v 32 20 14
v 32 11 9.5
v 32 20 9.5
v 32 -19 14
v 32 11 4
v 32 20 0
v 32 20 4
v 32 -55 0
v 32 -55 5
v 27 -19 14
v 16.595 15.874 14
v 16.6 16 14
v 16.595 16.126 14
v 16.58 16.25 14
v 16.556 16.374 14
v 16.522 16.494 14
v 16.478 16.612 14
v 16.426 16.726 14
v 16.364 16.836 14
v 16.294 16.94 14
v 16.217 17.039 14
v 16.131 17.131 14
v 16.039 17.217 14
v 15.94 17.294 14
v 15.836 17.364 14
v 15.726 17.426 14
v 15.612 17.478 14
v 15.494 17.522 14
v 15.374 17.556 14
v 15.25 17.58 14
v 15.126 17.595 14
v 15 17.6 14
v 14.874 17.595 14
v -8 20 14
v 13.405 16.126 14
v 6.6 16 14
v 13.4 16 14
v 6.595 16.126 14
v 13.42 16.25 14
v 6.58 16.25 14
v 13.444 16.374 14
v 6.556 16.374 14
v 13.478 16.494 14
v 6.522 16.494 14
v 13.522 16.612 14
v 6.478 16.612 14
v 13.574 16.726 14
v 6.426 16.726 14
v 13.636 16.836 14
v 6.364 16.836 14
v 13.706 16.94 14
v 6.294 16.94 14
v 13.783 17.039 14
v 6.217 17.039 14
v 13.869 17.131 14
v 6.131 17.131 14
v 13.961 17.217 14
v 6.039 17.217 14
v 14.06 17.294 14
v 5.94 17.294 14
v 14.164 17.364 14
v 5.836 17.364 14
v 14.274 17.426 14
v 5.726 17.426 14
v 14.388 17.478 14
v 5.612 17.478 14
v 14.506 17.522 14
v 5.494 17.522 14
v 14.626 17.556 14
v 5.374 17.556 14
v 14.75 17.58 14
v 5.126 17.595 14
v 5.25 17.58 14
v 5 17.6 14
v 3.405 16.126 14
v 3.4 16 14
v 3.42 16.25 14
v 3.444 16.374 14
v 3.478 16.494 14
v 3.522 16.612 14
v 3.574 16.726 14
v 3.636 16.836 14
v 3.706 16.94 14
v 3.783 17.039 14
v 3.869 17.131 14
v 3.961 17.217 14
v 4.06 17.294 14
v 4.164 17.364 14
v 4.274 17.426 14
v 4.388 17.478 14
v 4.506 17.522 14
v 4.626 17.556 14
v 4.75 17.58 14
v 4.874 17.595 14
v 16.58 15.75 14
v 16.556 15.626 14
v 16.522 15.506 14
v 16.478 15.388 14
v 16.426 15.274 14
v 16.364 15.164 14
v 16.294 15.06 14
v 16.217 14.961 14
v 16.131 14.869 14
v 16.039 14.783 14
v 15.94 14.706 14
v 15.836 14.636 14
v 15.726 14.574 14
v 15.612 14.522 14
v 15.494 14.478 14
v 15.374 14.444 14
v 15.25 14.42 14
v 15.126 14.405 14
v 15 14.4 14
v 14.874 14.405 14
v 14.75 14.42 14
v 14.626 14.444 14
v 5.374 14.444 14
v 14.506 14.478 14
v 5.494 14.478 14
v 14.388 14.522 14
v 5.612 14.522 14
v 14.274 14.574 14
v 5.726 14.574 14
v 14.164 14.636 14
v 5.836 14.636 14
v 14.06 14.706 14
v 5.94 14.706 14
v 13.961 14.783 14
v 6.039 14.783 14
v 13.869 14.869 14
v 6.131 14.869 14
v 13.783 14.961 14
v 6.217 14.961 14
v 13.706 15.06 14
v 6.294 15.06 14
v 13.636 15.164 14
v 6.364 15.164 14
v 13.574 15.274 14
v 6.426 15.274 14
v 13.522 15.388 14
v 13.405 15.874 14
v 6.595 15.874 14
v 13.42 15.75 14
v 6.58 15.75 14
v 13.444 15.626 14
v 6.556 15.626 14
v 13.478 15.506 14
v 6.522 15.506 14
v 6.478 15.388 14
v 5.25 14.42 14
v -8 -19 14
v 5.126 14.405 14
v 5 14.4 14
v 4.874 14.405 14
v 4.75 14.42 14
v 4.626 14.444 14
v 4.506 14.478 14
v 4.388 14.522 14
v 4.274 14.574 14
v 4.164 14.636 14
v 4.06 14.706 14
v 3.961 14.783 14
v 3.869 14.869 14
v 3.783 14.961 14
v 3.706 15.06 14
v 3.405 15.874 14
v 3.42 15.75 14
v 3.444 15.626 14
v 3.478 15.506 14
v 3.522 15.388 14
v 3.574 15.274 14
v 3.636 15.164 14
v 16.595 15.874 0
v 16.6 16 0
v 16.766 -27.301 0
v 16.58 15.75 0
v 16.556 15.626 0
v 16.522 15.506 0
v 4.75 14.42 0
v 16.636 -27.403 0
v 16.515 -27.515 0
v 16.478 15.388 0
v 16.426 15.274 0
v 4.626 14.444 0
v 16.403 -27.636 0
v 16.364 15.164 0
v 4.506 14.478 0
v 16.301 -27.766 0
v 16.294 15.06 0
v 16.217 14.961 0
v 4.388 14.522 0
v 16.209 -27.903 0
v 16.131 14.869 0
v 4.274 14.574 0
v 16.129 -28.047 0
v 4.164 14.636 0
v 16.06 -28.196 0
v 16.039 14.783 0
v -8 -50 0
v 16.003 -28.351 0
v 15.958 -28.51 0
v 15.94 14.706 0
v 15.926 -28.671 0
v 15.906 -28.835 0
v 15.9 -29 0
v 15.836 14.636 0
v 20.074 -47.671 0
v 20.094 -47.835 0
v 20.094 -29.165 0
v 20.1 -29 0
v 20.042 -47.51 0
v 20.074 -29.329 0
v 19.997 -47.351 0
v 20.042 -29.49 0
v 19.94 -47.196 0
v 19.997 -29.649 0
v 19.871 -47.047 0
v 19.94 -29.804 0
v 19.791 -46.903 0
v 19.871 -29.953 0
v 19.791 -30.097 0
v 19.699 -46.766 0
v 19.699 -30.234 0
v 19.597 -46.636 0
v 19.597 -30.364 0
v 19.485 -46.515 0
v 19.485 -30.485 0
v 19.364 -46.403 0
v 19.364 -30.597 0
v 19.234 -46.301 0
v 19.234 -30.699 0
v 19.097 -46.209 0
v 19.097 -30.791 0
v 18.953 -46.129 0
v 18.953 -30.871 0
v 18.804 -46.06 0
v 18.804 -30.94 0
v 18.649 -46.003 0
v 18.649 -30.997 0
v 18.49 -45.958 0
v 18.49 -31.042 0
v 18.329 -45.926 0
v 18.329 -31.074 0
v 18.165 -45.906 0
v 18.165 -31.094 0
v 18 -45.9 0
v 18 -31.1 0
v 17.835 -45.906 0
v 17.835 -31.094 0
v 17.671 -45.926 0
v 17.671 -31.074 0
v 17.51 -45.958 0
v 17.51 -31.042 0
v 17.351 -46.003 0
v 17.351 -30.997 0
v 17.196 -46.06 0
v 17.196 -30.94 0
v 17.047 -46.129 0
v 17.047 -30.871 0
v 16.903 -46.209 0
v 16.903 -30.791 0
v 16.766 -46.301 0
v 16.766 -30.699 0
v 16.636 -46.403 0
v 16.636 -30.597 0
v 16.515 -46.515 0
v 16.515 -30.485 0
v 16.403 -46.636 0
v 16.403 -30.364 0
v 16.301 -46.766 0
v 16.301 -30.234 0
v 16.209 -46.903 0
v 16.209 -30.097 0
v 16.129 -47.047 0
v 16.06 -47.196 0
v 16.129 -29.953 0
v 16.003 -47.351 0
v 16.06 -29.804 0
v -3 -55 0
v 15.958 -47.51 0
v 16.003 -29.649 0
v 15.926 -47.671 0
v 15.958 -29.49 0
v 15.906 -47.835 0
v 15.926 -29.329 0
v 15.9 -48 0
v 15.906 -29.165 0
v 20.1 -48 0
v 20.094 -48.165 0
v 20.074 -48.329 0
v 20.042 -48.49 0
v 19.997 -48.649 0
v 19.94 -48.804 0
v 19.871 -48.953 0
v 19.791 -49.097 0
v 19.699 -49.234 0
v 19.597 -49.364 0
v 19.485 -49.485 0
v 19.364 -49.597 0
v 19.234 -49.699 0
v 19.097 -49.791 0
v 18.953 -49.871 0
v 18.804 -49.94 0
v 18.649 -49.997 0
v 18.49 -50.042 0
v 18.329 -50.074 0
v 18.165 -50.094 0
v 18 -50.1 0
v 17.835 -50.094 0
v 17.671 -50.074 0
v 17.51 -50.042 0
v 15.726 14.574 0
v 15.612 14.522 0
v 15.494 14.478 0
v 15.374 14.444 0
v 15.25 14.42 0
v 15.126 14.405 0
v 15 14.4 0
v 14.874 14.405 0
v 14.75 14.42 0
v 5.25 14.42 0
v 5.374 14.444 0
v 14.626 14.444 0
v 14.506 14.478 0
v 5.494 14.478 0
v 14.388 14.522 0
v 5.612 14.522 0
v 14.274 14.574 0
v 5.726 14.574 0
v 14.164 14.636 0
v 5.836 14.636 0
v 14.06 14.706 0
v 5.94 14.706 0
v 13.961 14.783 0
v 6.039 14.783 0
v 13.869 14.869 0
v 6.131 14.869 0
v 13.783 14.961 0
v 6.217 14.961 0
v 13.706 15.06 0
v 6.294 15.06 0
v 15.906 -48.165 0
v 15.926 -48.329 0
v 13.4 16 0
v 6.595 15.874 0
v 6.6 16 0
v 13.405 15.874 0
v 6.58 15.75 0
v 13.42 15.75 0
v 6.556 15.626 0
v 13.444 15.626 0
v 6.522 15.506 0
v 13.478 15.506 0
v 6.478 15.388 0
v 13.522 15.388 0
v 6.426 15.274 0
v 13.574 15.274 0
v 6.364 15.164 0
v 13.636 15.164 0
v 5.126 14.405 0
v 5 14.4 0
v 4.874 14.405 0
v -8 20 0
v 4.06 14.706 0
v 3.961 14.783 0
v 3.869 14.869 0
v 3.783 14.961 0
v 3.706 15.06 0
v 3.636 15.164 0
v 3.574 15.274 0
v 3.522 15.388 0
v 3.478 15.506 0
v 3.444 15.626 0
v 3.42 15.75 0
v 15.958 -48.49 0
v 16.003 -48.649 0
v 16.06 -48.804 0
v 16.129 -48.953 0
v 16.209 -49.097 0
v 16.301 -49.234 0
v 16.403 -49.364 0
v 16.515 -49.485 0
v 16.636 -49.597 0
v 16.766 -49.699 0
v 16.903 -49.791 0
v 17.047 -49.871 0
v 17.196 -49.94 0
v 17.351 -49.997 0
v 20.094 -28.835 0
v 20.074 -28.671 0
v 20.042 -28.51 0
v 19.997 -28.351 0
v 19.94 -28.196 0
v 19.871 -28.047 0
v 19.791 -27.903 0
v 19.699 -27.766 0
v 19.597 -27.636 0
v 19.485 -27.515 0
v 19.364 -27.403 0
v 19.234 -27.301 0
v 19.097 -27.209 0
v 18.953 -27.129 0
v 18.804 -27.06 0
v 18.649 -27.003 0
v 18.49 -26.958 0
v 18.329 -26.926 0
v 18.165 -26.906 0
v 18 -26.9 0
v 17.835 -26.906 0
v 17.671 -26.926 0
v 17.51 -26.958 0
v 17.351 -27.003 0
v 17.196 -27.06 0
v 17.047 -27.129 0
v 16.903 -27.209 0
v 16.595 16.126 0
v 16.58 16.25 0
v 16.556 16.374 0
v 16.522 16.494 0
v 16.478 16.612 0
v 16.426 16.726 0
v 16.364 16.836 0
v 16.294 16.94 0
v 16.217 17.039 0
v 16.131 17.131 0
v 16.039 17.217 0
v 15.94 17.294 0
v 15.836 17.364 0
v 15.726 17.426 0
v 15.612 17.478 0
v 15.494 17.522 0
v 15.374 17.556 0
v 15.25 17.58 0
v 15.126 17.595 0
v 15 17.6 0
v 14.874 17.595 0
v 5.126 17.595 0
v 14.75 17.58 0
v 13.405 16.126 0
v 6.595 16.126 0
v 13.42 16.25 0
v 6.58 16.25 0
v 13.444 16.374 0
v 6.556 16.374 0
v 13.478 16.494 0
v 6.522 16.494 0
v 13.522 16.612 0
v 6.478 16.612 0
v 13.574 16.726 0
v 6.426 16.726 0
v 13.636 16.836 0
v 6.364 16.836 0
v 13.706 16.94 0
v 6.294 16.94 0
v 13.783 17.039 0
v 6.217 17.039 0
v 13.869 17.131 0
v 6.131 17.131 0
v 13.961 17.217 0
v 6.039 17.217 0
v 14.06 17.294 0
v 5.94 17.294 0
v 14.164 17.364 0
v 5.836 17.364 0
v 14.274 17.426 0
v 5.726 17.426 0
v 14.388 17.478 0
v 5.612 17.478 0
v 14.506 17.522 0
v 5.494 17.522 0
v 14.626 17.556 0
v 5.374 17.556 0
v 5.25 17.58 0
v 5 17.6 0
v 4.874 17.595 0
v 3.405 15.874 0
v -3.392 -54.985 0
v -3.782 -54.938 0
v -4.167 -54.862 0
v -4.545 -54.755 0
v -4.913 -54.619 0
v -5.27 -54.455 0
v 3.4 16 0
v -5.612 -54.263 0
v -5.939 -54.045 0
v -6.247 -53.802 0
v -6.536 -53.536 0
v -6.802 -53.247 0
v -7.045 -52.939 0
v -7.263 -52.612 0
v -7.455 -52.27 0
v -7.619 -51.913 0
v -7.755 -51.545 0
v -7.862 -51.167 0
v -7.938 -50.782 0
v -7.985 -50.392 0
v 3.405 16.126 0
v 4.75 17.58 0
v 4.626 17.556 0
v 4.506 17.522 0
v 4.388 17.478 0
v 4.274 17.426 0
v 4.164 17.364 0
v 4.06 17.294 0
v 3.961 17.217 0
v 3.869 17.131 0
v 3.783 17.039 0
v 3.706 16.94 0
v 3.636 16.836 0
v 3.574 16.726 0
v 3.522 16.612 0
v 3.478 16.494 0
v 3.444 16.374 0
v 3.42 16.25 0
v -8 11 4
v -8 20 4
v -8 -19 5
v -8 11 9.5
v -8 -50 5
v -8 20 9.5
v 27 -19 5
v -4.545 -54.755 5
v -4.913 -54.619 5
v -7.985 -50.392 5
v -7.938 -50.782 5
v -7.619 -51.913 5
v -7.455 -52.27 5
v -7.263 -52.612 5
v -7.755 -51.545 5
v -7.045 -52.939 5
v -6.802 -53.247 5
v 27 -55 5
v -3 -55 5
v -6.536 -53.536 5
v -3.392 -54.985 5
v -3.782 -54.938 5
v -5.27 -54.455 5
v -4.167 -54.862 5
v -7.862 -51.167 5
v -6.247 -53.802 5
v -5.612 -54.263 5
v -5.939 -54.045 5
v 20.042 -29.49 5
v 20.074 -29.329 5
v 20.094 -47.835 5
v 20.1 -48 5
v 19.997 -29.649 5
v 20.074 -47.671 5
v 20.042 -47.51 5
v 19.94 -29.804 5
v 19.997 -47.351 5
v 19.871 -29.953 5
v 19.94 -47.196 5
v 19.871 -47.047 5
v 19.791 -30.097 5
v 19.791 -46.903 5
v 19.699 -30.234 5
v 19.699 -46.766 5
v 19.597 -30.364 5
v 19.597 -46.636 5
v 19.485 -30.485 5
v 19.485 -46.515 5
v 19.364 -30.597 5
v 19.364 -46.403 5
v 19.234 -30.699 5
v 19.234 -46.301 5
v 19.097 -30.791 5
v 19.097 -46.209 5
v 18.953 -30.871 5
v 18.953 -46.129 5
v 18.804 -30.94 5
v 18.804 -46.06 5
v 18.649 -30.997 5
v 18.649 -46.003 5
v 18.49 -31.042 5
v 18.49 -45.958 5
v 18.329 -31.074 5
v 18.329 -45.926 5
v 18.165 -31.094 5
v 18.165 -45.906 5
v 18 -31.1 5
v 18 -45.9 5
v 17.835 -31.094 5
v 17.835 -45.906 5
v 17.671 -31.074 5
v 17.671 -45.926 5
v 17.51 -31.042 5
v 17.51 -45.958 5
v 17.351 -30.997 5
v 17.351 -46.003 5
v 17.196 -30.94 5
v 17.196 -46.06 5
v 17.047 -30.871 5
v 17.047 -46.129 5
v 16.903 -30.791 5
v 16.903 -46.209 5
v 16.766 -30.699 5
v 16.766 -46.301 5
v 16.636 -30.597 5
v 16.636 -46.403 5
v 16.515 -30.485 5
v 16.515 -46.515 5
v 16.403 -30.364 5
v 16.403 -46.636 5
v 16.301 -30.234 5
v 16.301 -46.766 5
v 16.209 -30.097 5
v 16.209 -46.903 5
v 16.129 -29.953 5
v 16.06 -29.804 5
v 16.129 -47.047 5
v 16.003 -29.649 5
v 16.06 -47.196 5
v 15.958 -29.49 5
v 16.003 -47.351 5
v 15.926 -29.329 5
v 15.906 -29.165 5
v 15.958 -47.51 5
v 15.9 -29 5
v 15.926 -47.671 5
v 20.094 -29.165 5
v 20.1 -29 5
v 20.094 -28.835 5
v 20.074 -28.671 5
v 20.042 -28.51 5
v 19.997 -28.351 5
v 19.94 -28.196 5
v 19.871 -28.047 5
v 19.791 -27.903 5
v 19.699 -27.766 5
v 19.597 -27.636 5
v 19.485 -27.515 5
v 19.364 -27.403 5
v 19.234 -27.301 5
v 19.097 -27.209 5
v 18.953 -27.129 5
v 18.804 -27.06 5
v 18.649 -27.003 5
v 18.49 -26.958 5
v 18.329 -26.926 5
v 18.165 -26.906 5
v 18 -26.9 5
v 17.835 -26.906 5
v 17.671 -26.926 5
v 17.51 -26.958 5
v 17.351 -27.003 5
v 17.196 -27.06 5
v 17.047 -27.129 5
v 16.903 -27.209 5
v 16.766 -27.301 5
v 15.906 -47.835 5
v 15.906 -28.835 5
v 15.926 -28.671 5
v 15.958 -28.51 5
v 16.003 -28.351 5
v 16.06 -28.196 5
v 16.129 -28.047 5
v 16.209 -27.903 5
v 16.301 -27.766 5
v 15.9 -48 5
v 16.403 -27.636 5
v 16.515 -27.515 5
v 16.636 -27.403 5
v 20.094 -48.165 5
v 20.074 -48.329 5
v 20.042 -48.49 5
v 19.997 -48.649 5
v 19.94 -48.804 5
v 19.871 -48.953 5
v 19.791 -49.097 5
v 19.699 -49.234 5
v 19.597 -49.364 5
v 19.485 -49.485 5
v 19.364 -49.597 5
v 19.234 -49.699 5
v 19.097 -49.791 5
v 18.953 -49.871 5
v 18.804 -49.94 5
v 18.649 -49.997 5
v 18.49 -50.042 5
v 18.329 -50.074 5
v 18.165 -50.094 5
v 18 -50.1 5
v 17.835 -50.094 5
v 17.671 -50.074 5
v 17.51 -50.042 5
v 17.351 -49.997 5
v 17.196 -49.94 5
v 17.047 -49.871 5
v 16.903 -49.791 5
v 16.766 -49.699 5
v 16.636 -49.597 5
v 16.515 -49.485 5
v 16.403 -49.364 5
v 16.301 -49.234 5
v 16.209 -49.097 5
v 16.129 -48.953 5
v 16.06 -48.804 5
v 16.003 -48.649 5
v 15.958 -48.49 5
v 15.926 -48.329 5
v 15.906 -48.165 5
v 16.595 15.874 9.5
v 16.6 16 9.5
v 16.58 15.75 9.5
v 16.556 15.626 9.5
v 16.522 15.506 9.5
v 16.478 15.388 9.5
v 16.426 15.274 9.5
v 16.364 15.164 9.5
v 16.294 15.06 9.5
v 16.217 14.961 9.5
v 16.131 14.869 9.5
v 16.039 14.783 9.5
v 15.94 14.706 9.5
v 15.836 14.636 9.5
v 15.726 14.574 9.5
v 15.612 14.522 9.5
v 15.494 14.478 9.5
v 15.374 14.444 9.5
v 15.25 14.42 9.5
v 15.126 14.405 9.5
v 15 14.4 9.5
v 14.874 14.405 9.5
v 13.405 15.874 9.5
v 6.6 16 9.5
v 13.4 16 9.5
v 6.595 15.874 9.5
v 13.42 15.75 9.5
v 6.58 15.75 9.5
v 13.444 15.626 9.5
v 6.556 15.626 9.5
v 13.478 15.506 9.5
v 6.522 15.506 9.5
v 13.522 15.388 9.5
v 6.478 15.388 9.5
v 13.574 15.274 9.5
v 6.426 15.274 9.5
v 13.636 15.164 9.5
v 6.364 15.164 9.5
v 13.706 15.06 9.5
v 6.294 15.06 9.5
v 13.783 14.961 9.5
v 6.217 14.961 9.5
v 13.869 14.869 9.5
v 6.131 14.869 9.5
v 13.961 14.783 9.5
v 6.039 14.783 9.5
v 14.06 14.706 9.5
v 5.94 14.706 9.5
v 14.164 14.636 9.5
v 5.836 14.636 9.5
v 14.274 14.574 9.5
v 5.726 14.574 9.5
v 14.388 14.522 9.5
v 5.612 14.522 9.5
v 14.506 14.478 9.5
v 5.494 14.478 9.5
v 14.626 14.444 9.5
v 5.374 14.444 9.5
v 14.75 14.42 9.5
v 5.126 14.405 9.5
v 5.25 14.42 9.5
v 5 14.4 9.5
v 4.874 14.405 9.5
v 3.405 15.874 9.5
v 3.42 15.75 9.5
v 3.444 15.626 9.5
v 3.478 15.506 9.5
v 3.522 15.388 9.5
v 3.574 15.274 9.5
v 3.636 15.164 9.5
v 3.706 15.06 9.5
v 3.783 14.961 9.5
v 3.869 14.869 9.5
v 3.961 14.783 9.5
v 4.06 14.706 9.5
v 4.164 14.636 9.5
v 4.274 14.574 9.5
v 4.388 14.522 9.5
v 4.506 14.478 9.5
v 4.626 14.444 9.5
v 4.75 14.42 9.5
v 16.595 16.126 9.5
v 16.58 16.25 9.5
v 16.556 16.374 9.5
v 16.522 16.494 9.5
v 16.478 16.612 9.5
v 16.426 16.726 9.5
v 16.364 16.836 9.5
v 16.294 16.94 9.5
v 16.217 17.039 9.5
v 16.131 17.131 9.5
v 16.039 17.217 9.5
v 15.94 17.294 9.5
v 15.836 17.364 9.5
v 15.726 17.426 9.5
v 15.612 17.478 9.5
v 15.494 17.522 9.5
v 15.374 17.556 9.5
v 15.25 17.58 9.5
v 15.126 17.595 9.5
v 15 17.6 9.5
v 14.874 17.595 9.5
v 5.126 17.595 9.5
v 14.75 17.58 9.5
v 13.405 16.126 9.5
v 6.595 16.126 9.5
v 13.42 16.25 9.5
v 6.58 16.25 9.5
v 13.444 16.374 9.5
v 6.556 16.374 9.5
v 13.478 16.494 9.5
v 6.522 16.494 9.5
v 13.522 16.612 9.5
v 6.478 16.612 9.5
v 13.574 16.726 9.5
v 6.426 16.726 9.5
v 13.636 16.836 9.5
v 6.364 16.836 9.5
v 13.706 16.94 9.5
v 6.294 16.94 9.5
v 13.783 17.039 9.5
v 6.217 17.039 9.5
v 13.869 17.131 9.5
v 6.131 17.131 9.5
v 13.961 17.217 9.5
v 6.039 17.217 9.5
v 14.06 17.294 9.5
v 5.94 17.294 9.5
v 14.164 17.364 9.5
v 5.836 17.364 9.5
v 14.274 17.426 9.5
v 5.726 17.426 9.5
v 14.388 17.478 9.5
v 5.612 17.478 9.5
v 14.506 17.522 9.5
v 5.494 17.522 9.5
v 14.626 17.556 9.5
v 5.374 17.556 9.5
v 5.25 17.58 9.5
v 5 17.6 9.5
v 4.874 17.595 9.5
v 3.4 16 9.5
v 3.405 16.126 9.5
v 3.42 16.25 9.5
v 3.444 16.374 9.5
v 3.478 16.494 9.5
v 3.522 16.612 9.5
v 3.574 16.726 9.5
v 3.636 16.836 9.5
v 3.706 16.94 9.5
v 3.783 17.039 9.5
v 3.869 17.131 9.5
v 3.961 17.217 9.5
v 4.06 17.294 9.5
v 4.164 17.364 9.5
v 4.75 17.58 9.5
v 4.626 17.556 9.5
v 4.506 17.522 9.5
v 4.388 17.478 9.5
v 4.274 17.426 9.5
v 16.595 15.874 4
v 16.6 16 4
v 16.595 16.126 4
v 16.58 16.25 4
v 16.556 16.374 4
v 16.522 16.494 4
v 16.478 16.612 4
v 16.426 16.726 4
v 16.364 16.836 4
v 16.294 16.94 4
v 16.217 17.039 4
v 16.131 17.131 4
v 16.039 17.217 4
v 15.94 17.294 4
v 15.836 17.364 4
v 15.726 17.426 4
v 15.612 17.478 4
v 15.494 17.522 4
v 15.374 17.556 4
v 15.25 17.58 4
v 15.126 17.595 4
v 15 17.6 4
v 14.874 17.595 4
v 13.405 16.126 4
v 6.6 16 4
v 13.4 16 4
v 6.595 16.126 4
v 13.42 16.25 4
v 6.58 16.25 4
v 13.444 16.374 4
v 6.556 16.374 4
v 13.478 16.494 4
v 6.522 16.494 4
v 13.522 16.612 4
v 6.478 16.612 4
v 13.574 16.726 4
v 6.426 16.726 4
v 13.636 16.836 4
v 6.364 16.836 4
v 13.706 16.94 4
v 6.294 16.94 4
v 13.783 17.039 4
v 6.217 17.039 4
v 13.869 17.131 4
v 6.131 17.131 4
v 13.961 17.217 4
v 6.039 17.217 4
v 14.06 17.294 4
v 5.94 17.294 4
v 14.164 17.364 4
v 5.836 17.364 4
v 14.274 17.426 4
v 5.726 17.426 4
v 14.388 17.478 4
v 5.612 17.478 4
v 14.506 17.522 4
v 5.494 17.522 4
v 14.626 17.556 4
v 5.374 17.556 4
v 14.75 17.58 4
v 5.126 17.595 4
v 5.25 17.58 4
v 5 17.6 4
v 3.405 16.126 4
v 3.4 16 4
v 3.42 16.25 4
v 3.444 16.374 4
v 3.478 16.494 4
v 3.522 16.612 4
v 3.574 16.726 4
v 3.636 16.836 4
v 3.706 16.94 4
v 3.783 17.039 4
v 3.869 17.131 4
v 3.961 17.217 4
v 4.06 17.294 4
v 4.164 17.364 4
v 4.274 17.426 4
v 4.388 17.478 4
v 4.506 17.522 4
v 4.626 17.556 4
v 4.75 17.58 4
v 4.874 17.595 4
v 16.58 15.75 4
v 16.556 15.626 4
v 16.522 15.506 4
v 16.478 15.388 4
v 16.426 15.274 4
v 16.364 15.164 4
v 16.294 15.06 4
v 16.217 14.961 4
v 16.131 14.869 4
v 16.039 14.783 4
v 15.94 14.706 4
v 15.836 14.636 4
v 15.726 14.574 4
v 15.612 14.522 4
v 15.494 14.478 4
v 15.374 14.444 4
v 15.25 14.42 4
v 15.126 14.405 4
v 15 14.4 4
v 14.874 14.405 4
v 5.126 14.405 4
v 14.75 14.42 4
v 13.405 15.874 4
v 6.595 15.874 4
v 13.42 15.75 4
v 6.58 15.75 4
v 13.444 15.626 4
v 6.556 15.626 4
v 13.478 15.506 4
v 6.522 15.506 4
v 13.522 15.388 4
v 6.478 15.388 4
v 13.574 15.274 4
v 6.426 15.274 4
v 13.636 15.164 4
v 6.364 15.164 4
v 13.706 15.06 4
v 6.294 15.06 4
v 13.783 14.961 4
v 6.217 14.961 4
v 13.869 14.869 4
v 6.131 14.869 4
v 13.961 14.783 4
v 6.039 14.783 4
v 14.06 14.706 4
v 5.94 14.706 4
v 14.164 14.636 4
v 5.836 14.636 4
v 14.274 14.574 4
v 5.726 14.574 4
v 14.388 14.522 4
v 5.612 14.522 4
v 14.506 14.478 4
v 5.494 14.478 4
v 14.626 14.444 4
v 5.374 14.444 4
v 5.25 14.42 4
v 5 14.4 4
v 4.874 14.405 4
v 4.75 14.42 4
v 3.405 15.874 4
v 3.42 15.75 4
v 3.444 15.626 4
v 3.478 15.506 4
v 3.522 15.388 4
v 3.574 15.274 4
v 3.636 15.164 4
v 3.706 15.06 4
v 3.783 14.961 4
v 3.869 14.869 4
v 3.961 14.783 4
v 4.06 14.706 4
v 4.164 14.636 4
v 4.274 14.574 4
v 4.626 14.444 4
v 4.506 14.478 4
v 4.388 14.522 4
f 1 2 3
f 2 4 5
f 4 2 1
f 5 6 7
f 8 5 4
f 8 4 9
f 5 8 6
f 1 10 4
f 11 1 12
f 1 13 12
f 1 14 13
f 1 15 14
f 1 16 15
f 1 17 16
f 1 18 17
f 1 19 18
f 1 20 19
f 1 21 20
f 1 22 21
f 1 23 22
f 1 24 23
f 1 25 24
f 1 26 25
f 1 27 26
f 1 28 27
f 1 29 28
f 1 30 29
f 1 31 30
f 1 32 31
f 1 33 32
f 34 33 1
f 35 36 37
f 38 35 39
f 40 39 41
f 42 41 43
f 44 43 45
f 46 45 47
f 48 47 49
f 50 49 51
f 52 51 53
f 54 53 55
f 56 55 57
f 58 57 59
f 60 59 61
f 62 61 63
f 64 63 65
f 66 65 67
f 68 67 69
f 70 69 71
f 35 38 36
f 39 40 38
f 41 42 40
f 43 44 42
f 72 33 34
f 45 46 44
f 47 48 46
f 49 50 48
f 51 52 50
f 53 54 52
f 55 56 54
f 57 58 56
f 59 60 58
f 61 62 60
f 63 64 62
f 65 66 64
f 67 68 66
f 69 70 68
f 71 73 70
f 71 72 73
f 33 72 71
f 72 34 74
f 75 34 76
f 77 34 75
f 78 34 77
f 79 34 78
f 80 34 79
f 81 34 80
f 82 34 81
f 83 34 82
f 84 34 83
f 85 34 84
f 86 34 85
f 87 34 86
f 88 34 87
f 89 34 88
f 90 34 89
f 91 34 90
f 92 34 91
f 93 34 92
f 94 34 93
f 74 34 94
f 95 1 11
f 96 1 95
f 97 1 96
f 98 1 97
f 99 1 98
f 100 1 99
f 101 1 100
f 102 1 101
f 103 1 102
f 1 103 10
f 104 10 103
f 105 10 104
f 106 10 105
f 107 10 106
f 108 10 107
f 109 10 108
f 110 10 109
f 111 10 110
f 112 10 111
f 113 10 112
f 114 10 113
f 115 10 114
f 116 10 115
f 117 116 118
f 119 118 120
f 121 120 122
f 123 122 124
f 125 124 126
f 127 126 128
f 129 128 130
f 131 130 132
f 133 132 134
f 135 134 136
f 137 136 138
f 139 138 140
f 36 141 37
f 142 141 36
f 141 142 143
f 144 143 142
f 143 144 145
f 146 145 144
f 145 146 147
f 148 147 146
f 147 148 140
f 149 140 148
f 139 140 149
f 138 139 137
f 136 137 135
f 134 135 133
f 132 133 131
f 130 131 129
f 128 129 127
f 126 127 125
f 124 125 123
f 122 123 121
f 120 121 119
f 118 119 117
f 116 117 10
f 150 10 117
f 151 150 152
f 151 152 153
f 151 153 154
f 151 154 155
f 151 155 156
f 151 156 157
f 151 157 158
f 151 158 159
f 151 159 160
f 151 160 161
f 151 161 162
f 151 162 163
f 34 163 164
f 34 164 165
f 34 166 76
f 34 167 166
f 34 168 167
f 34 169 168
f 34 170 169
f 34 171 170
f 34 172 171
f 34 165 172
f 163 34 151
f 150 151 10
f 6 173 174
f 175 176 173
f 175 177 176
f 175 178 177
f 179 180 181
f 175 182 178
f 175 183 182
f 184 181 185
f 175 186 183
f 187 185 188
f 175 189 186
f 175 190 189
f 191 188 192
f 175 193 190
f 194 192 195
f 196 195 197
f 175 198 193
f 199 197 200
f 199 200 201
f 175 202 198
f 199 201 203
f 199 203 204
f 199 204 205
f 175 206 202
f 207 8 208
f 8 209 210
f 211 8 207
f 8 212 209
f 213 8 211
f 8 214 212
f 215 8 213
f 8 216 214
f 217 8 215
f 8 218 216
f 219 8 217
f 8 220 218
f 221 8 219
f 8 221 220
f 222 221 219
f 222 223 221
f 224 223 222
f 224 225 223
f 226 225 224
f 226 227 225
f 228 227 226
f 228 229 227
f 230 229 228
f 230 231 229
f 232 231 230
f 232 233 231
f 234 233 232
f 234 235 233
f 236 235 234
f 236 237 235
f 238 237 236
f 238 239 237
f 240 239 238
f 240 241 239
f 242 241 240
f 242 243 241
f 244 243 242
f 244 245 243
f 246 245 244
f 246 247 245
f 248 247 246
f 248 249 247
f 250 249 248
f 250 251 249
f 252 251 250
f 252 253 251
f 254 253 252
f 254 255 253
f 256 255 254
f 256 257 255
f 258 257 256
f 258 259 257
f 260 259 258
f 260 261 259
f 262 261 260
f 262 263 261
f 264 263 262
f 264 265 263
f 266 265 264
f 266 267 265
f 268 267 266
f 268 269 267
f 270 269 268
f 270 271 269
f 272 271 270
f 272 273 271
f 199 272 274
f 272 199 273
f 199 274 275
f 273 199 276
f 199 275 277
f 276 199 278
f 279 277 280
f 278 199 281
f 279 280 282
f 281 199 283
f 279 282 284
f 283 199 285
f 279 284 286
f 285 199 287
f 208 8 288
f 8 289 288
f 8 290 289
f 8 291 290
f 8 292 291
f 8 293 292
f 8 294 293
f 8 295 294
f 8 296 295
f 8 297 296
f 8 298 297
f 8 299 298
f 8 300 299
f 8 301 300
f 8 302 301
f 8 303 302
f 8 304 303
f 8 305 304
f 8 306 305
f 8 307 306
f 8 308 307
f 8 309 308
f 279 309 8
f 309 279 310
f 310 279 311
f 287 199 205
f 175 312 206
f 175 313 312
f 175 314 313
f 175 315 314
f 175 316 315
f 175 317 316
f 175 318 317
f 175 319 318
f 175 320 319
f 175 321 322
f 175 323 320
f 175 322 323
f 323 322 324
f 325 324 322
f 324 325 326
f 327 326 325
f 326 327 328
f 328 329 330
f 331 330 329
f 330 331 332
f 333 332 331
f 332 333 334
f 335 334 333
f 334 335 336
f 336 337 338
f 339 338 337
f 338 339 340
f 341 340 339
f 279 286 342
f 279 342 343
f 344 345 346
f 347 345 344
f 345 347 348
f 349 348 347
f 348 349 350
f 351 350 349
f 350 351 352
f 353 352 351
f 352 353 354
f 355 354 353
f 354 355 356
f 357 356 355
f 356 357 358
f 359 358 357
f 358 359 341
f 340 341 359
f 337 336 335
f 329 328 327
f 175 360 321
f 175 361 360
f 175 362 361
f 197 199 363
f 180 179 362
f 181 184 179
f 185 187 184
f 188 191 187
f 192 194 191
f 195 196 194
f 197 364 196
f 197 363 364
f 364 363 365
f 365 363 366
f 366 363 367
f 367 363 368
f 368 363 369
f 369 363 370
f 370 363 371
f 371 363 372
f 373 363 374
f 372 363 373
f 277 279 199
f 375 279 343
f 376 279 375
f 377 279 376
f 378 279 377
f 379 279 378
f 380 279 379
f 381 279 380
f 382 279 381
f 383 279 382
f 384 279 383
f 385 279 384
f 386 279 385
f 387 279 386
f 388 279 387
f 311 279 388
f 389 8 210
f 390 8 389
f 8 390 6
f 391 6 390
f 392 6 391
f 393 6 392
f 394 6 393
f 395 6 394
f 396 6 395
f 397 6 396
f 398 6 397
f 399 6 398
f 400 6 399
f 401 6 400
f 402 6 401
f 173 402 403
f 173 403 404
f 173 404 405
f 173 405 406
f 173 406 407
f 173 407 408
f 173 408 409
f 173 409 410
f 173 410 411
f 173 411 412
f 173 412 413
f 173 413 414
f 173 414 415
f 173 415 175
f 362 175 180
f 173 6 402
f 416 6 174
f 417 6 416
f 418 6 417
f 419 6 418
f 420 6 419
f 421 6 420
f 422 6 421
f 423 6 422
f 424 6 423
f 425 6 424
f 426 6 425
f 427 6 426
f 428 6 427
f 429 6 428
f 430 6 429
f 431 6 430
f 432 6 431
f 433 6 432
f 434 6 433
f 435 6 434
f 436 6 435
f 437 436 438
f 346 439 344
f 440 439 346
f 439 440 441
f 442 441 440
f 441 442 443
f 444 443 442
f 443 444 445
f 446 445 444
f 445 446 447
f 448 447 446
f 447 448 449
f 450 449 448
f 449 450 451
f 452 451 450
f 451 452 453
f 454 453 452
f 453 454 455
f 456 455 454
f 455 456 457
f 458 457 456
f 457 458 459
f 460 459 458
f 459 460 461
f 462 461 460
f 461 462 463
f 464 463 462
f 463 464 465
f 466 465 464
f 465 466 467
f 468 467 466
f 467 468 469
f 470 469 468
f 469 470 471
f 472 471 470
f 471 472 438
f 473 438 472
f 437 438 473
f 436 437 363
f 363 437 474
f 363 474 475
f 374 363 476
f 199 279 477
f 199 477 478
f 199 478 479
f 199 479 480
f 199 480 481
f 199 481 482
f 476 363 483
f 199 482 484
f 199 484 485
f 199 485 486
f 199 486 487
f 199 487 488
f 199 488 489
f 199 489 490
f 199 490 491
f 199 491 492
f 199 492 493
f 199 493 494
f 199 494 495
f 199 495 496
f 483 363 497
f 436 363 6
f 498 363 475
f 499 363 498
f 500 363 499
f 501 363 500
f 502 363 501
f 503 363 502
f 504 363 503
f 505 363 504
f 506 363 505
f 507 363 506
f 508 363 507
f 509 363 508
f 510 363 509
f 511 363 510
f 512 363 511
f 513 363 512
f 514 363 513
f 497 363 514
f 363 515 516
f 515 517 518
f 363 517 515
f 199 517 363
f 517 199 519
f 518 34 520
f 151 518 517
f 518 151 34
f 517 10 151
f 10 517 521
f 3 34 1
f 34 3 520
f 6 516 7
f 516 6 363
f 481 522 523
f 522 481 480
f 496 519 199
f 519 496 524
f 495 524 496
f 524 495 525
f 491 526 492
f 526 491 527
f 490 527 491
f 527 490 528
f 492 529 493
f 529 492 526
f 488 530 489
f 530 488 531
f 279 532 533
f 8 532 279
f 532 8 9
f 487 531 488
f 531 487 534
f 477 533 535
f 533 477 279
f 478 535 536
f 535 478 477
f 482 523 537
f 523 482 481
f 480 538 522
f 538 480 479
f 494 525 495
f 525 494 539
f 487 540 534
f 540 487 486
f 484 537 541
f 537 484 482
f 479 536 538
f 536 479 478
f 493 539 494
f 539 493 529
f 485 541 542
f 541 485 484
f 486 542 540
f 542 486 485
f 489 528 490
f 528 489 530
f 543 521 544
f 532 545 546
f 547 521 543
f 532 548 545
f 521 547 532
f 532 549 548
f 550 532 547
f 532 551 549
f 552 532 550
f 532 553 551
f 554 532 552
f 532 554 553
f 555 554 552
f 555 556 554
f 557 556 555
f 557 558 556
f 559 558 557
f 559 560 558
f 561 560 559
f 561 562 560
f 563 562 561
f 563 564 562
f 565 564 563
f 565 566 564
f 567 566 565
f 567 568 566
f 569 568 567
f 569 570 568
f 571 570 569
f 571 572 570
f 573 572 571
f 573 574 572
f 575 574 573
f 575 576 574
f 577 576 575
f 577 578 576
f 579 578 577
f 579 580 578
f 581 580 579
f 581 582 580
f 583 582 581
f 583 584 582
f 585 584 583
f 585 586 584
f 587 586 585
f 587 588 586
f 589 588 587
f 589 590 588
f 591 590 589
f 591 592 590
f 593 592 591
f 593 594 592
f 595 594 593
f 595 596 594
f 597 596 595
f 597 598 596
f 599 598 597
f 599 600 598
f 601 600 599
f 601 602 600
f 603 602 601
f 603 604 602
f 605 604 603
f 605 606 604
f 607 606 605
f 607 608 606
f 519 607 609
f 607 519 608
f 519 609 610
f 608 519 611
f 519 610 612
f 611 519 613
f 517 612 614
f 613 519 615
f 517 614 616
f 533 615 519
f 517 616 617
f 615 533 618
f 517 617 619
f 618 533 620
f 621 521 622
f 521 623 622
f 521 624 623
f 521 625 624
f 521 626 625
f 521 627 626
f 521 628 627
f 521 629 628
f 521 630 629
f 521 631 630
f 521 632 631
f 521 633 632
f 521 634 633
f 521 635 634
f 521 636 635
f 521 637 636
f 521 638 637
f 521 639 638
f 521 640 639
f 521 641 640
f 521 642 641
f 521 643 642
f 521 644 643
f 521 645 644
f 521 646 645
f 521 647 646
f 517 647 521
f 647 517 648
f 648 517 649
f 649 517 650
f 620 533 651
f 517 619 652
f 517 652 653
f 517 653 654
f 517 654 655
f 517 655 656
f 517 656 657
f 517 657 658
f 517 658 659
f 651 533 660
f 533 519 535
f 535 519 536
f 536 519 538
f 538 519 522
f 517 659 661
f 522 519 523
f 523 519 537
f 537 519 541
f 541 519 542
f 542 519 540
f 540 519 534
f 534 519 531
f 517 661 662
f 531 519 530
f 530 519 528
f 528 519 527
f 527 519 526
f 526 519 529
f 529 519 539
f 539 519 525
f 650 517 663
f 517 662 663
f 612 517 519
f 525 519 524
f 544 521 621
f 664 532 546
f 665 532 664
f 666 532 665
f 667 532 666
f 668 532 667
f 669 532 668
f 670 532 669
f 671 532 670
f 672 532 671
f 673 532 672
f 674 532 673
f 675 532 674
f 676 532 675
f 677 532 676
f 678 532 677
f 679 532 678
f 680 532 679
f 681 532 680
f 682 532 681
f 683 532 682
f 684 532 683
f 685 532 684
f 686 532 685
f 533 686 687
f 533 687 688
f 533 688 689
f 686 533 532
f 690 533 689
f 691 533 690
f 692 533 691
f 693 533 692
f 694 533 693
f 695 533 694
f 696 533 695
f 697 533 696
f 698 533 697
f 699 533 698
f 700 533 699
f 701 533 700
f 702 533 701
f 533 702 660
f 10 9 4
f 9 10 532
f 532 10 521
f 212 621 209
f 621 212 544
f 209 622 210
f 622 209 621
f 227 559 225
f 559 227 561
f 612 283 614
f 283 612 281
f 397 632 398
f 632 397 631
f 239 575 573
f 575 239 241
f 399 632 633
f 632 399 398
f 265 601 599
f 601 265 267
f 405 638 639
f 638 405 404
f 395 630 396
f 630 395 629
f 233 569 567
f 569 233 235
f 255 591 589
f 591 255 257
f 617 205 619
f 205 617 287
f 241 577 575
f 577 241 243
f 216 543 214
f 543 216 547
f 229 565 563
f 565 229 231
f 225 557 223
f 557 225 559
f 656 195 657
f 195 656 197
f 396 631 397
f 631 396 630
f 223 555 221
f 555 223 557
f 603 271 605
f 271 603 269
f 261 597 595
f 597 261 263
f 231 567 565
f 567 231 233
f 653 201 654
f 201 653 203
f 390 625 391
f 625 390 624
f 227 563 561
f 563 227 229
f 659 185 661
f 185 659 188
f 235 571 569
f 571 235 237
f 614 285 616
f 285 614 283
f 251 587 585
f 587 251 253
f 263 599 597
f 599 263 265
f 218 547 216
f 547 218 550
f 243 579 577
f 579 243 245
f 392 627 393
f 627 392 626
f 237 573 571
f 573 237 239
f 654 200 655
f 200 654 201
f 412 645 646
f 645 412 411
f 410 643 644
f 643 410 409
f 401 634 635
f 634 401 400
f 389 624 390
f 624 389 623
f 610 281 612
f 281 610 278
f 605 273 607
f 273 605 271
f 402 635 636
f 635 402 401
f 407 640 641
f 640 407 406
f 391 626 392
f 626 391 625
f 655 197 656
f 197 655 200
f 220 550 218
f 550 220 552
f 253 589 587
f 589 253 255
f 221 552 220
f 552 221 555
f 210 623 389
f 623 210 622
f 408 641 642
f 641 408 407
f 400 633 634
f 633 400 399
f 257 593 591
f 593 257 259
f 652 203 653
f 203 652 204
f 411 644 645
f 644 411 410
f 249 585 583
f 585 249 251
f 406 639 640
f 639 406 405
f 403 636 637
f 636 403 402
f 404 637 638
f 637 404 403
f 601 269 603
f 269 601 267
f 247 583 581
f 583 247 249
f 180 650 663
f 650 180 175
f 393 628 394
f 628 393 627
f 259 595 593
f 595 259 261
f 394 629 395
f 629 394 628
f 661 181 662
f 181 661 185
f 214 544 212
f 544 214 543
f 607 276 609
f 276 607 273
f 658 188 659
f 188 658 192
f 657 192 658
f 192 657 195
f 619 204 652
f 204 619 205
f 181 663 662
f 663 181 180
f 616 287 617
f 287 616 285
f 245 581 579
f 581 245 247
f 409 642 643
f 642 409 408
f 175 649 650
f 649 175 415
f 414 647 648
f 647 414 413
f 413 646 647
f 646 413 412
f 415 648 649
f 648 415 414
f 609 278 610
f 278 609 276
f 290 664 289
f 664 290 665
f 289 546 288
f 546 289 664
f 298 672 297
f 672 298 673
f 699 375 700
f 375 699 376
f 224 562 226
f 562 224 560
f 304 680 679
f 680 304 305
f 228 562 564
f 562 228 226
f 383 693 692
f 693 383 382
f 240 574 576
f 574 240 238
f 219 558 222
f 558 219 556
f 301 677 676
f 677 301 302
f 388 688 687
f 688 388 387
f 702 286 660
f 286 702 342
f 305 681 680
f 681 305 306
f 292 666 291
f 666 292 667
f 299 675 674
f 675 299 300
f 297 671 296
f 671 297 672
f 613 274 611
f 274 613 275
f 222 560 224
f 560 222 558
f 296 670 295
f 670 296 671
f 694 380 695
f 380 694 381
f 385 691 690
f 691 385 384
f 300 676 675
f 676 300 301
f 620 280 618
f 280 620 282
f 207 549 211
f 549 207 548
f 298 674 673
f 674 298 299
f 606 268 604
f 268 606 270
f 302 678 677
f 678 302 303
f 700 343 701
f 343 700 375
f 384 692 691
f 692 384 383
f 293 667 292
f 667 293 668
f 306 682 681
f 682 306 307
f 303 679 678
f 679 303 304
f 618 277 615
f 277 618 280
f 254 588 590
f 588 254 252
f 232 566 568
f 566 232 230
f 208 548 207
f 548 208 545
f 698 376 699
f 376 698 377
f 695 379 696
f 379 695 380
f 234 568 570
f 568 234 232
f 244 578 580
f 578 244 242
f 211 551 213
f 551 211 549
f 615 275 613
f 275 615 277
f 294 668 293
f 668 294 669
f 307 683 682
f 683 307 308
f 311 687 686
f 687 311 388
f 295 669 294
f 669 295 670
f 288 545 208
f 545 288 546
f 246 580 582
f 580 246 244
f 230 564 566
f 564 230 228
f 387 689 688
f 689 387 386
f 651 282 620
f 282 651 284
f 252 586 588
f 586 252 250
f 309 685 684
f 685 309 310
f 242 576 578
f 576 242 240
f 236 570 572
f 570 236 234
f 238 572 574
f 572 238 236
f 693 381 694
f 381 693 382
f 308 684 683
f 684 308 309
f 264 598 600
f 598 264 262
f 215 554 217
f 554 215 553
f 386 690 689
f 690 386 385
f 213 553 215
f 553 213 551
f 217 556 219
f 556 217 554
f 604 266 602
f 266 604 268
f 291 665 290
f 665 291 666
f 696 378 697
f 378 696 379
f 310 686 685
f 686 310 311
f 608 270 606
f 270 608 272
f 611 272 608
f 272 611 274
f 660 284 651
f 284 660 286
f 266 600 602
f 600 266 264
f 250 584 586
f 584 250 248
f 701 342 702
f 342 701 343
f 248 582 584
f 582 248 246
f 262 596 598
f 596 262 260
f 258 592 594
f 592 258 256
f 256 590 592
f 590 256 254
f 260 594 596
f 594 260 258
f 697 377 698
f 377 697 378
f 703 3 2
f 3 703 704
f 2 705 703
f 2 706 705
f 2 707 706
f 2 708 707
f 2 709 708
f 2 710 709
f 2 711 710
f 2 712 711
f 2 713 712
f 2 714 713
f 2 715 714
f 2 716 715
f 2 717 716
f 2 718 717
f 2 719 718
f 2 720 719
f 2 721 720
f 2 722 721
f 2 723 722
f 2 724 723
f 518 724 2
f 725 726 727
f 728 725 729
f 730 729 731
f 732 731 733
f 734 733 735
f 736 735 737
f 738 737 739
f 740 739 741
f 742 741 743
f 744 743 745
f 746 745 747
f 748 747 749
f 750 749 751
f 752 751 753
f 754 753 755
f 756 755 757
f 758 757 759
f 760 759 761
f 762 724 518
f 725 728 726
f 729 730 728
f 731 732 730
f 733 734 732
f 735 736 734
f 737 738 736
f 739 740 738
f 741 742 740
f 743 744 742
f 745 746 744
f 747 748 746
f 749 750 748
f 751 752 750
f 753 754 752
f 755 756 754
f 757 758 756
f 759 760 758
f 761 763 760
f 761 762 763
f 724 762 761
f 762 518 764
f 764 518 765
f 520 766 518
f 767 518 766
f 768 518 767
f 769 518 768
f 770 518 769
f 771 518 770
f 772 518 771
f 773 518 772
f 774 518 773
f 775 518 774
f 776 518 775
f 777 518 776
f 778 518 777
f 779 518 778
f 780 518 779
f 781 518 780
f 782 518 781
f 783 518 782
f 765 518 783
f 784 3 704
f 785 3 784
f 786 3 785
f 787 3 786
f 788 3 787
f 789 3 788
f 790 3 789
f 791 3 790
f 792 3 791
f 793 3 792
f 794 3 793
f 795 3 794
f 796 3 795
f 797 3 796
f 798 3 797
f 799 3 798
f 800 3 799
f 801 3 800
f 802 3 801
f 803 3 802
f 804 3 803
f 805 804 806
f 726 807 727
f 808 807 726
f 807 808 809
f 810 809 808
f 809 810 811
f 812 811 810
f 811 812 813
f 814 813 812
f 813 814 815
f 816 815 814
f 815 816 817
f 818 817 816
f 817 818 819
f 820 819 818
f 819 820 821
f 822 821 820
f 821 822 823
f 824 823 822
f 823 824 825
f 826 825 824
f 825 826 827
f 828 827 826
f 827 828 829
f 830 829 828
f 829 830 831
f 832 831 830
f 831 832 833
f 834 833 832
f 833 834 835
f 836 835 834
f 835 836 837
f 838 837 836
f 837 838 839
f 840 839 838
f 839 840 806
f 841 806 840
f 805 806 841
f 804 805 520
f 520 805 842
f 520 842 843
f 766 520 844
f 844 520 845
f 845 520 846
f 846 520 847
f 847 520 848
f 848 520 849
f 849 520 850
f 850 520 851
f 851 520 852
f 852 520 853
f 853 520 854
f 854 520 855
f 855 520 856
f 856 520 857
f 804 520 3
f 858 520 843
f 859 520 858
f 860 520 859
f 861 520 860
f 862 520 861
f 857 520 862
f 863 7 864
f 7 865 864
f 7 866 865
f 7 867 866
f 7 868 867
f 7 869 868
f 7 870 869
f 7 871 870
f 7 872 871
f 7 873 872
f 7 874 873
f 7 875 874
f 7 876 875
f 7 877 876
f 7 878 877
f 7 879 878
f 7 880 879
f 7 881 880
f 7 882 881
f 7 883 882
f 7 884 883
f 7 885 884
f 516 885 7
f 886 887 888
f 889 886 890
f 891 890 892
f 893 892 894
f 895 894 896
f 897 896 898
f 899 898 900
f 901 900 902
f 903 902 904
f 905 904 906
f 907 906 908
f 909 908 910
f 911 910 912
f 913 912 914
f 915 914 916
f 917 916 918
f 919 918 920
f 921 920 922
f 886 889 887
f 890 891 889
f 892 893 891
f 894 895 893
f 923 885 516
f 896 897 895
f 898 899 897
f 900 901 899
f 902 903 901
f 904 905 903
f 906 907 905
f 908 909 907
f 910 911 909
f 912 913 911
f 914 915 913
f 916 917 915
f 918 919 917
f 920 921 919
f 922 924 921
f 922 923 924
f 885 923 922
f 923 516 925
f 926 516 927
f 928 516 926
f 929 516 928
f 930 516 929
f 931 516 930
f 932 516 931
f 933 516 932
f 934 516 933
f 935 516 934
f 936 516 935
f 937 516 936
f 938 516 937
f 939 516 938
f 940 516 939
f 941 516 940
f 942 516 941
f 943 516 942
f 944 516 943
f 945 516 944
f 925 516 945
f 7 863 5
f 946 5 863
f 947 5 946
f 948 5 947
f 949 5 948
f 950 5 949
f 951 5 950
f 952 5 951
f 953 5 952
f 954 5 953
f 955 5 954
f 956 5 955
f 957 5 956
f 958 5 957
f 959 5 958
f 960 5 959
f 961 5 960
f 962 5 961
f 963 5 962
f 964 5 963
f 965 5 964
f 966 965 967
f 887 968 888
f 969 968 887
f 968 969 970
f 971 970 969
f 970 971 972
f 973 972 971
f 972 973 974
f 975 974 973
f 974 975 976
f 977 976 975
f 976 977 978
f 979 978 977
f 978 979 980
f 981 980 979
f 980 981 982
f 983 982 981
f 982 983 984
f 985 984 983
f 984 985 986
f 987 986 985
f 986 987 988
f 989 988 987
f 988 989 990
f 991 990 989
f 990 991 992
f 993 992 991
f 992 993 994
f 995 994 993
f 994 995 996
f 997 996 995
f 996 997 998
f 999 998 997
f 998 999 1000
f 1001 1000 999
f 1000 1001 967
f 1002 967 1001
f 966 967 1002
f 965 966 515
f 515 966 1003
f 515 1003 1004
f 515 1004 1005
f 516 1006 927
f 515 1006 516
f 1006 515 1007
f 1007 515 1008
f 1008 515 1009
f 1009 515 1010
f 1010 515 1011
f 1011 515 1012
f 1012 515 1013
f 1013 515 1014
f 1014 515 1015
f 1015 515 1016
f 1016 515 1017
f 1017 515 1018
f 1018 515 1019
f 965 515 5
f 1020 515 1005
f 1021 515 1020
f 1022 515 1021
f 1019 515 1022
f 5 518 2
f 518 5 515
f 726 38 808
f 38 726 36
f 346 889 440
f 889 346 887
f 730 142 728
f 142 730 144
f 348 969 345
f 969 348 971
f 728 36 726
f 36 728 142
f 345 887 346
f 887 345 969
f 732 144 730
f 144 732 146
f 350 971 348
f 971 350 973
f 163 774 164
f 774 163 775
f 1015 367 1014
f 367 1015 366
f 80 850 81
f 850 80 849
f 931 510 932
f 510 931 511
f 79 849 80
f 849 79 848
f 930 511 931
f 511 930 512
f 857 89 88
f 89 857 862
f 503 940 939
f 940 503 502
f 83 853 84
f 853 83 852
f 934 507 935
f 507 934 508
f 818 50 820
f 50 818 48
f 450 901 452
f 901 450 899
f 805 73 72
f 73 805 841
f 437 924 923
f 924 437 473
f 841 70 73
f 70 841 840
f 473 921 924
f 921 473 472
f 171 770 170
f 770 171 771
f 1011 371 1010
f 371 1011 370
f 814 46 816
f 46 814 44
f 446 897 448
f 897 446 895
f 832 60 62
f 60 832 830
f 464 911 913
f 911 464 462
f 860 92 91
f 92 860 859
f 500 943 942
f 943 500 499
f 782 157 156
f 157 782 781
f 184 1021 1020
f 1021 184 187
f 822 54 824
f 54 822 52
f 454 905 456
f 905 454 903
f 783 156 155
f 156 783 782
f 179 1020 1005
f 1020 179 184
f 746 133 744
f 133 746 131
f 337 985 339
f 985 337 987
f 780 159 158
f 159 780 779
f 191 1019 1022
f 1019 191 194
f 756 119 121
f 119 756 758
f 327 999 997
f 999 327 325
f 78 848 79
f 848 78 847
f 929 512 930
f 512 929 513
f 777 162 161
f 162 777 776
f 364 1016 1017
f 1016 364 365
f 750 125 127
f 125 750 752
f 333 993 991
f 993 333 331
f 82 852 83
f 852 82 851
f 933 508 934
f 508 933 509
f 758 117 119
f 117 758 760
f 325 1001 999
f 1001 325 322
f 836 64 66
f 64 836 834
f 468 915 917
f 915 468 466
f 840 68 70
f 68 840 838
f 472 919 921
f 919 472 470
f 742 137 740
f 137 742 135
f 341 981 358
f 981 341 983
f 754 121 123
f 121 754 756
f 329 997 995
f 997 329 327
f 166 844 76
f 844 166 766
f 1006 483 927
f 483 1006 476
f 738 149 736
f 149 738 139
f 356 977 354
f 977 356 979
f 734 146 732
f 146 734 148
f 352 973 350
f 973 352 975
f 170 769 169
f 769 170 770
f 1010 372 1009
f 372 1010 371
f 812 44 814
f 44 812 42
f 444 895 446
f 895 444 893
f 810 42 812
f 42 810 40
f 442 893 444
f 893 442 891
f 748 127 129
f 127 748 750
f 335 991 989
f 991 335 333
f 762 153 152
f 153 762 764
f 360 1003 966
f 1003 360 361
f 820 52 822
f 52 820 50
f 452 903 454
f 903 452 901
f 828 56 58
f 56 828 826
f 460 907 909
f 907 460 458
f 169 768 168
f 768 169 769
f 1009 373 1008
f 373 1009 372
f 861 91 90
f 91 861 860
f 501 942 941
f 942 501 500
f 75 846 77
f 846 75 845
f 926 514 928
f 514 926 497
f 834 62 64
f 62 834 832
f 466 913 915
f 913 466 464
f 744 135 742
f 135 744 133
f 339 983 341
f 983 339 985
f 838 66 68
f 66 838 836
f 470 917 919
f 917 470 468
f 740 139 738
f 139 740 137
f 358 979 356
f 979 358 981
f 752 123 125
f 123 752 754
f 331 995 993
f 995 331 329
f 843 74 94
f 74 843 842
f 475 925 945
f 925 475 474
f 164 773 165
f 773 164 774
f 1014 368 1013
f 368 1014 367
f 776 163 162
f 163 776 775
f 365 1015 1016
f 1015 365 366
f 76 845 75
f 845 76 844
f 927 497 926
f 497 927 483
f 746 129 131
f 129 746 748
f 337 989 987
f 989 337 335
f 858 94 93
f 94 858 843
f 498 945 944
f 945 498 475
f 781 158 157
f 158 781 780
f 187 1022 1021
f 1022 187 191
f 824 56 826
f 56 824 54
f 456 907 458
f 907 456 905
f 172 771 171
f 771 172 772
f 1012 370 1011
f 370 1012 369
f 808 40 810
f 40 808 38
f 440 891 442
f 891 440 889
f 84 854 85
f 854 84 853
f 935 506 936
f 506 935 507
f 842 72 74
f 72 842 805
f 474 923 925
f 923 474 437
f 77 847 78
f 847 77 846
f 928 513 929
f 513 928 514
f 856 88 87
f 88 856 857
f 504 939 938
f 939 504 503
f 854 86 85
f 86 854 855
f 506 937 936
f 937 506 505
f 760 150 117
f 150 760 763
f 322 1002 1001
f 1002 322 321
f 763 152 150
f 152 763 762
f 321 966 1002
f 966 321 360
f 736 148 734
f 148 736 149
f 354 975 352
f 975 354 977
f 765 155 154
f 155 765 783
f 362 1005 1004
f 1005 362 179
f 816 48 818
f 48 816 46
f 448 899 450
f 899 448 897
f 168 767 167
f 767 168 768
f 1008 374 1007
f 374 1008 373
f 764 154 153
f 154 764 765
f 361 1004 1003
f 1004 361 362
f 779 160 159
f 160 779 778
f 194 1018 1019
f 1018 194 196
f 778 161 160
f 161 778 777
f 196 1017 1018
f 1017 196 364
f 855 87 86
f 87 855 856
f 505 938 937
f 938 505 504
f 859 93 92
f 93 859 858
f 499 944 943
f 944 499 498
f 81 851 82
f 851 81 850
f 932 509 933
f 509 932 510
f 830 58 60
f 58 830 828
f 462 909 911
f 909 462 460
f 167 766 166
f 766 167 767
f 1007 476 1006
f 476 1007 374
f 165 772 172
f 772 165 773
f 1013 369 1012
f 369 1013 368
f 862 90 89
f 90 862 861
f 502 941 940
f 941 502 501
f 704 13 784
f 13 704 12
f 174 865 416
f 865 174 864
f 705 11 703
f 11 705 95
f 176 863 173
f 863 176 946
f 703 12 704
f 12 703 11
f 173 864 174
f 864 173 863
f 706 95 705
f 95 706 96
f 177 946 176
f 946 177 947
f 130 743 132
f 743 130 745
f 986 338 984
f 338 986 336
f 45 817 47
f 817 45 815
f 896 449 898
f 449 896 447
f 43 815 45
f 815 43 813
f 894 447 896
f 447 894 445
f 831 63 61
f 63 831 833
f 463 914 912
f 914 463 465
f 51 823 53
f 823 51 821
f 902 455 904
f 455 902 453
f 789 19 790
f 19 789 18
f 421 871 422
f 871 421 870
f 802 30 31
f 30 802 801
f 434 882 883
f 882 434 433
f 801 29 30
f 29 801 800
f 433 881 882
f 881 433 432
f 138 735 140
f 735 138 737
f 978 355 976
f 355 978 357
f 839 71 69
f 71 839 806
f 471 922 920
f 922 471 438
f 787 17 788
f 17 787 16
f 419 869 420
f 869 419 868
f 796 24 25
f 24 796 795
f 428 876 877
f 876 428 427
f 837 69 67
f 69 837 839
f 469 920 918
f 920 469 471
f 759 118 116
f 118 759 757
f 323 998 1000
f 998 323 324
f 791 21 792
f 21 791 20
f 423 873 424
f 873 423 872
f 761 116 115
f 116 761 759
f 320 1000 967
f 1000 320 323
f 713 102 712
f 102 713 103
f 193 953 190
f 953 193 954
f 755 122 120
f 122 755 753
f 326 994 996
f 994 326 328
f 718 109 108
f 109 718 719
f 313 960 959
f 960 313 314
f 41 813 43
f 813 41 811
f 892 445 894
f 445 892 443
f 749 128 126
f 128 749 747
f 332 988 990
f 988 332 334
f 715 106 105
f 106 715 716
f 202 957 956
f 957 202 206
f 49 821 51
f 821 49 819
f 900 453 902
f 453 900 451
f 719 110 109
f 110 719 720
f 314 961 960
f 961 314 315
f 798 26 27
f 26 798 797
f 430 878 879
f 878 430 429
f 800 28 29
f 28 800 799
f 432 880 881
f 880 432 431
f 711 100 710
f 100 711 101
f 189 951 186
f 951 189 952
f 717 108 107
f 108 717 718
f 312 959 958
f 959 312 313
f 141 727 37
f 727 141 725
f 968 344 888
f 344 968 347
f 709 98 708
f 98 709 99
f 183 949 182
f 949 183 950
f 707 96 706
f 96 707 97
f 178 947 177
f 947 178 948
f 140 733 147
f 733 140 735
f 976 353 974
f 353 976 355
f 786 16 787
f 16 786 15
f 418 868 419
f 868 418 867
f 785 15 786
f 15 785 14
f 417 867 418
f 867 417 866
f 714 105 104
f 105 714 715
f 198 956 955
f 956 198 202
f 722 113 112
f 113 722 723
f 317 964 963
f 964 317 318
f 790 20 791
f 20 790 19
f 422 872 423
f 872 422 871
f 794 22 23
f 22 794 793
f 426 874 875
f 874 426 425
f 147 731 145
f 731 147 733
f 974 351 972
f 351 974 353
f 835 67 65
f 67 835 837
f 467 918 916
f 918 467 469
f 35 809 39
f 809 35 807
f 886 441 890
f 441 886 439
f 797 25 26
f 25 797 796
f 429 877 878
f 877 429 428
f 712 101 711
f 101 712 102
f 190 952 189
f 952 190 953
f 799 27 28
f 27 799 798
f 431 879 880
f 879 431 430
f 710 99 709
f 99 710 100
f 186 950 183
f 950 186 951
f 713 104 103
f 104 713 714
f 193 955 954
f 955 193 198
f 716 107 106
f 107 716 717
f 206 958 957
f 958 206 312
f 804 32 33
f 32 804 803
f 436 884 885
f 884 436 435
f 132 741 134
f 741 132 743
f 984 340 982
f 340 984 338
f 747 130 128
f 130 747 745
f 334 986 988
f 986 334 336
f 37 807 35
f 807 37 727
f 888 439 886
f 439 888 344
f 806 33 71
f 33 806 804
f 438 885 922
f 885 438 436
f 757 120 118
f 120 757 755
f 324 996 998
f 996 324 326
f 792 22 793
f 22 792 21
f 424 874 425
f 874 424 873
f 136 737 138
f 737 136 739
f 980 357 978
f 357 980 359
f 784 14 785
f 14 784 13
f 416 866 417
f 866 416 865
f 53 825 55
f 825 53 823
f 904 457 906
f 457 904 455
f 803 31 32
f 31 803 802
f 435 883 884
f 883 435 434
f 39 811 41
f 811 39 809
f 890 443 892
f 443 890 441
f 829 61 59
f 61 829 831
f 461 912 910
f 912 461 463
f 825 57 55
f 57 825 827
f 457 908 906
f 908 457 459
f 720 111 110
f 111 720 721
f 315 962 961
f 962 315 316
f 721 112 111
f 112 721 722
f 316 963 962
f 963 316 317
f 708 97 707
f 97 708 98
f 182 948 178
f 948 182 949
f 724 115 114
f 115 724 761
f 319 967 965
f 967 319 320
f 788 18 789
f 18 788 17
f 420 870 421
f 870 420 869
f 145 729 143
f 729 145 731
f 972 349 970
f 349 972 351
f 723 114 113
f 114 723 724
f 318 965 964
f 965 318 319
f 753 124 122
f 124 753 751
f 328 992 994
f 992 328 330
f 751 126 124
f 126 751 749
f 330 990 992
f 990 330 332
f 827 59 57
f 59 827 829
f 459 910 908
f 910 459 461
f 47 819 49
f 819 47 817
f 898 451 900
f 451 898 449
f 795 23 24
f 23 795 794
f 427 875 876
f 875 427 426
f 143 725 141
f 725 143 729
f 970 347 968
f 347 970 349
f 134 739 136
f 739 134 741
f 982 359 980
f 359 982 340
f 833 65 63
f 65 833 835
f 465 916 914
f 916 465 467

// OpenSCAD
$fn=80;
thick=14;

% old();
new();

module old() {
   mirror([0,1,0]) difference() {
      union() {
         translate([-8,0,0]) cube([40,19,thick]);
         hull() {
            translate([-8+20,0,0]) cube([20, 55,5]);
            translate([-8,0,0]) cube([20, 31,5]);
            translate([-3,55-5,0]) cylinder(h=5,r=5);
         }

         translate([27,0,0]) rotate([90,0,90]) linear_extrude(height=5)
            polygon(points=[[19,0], [19,thick],[55,5], [55,0]]);
      }

      // translate([18,23,-0.5]) cylinder(d=4.2,h=10);
      translate([18,29,-0.5]) cylinder(d=4.2,h=10);
      translate([18,48,-0.5]) cylinder(d=4.2,h=10);

      // cutout for carriage wall
      translate([-9,-1,4]) cube([50,10,5.5]);

      translate([5,4,-1]) cylinder(d=3.2,h=20);
      translate([15,4,-1]) cylinder(d=3.2,h=20);
   }
}

module new() {
   mirror([0,1,0]) difference() {
      union() {
         translate([-8,-20,0]) cube([40,39,thick]);
         hull() {
            translate([-8+20,0,0]) cube([20, 55,5]);
            translate([-8,0,0]) cube([20, 31,5]);
            translate([-3,55-5,0]) cylinder(h=5,r=5);
         }

         translate([27,0,0]) rotate([90,0,90]) linear_extrude(height=5)
            polygon(points=[[19,0], [19,thick],[55,5], [55,0]]);
      }

      // translate([18,23,-0.5]) cylinder(d=4.2,h=10);
      translate([18,29,-0.5]) cylinder(d=4.2,h=10);
      translate([18,48,-0.5]) cylinder(d=4.2,h=10);

      // cutout for carriage wall
      translate([-9,-21,4]) cube([50,10,5.5]);

      translate([5,4-20,-1]) cylinder(d=3.2,h=20);
      translate([15,4-20,-1]) cylinder(d=3.2,h=20);
   }
}
